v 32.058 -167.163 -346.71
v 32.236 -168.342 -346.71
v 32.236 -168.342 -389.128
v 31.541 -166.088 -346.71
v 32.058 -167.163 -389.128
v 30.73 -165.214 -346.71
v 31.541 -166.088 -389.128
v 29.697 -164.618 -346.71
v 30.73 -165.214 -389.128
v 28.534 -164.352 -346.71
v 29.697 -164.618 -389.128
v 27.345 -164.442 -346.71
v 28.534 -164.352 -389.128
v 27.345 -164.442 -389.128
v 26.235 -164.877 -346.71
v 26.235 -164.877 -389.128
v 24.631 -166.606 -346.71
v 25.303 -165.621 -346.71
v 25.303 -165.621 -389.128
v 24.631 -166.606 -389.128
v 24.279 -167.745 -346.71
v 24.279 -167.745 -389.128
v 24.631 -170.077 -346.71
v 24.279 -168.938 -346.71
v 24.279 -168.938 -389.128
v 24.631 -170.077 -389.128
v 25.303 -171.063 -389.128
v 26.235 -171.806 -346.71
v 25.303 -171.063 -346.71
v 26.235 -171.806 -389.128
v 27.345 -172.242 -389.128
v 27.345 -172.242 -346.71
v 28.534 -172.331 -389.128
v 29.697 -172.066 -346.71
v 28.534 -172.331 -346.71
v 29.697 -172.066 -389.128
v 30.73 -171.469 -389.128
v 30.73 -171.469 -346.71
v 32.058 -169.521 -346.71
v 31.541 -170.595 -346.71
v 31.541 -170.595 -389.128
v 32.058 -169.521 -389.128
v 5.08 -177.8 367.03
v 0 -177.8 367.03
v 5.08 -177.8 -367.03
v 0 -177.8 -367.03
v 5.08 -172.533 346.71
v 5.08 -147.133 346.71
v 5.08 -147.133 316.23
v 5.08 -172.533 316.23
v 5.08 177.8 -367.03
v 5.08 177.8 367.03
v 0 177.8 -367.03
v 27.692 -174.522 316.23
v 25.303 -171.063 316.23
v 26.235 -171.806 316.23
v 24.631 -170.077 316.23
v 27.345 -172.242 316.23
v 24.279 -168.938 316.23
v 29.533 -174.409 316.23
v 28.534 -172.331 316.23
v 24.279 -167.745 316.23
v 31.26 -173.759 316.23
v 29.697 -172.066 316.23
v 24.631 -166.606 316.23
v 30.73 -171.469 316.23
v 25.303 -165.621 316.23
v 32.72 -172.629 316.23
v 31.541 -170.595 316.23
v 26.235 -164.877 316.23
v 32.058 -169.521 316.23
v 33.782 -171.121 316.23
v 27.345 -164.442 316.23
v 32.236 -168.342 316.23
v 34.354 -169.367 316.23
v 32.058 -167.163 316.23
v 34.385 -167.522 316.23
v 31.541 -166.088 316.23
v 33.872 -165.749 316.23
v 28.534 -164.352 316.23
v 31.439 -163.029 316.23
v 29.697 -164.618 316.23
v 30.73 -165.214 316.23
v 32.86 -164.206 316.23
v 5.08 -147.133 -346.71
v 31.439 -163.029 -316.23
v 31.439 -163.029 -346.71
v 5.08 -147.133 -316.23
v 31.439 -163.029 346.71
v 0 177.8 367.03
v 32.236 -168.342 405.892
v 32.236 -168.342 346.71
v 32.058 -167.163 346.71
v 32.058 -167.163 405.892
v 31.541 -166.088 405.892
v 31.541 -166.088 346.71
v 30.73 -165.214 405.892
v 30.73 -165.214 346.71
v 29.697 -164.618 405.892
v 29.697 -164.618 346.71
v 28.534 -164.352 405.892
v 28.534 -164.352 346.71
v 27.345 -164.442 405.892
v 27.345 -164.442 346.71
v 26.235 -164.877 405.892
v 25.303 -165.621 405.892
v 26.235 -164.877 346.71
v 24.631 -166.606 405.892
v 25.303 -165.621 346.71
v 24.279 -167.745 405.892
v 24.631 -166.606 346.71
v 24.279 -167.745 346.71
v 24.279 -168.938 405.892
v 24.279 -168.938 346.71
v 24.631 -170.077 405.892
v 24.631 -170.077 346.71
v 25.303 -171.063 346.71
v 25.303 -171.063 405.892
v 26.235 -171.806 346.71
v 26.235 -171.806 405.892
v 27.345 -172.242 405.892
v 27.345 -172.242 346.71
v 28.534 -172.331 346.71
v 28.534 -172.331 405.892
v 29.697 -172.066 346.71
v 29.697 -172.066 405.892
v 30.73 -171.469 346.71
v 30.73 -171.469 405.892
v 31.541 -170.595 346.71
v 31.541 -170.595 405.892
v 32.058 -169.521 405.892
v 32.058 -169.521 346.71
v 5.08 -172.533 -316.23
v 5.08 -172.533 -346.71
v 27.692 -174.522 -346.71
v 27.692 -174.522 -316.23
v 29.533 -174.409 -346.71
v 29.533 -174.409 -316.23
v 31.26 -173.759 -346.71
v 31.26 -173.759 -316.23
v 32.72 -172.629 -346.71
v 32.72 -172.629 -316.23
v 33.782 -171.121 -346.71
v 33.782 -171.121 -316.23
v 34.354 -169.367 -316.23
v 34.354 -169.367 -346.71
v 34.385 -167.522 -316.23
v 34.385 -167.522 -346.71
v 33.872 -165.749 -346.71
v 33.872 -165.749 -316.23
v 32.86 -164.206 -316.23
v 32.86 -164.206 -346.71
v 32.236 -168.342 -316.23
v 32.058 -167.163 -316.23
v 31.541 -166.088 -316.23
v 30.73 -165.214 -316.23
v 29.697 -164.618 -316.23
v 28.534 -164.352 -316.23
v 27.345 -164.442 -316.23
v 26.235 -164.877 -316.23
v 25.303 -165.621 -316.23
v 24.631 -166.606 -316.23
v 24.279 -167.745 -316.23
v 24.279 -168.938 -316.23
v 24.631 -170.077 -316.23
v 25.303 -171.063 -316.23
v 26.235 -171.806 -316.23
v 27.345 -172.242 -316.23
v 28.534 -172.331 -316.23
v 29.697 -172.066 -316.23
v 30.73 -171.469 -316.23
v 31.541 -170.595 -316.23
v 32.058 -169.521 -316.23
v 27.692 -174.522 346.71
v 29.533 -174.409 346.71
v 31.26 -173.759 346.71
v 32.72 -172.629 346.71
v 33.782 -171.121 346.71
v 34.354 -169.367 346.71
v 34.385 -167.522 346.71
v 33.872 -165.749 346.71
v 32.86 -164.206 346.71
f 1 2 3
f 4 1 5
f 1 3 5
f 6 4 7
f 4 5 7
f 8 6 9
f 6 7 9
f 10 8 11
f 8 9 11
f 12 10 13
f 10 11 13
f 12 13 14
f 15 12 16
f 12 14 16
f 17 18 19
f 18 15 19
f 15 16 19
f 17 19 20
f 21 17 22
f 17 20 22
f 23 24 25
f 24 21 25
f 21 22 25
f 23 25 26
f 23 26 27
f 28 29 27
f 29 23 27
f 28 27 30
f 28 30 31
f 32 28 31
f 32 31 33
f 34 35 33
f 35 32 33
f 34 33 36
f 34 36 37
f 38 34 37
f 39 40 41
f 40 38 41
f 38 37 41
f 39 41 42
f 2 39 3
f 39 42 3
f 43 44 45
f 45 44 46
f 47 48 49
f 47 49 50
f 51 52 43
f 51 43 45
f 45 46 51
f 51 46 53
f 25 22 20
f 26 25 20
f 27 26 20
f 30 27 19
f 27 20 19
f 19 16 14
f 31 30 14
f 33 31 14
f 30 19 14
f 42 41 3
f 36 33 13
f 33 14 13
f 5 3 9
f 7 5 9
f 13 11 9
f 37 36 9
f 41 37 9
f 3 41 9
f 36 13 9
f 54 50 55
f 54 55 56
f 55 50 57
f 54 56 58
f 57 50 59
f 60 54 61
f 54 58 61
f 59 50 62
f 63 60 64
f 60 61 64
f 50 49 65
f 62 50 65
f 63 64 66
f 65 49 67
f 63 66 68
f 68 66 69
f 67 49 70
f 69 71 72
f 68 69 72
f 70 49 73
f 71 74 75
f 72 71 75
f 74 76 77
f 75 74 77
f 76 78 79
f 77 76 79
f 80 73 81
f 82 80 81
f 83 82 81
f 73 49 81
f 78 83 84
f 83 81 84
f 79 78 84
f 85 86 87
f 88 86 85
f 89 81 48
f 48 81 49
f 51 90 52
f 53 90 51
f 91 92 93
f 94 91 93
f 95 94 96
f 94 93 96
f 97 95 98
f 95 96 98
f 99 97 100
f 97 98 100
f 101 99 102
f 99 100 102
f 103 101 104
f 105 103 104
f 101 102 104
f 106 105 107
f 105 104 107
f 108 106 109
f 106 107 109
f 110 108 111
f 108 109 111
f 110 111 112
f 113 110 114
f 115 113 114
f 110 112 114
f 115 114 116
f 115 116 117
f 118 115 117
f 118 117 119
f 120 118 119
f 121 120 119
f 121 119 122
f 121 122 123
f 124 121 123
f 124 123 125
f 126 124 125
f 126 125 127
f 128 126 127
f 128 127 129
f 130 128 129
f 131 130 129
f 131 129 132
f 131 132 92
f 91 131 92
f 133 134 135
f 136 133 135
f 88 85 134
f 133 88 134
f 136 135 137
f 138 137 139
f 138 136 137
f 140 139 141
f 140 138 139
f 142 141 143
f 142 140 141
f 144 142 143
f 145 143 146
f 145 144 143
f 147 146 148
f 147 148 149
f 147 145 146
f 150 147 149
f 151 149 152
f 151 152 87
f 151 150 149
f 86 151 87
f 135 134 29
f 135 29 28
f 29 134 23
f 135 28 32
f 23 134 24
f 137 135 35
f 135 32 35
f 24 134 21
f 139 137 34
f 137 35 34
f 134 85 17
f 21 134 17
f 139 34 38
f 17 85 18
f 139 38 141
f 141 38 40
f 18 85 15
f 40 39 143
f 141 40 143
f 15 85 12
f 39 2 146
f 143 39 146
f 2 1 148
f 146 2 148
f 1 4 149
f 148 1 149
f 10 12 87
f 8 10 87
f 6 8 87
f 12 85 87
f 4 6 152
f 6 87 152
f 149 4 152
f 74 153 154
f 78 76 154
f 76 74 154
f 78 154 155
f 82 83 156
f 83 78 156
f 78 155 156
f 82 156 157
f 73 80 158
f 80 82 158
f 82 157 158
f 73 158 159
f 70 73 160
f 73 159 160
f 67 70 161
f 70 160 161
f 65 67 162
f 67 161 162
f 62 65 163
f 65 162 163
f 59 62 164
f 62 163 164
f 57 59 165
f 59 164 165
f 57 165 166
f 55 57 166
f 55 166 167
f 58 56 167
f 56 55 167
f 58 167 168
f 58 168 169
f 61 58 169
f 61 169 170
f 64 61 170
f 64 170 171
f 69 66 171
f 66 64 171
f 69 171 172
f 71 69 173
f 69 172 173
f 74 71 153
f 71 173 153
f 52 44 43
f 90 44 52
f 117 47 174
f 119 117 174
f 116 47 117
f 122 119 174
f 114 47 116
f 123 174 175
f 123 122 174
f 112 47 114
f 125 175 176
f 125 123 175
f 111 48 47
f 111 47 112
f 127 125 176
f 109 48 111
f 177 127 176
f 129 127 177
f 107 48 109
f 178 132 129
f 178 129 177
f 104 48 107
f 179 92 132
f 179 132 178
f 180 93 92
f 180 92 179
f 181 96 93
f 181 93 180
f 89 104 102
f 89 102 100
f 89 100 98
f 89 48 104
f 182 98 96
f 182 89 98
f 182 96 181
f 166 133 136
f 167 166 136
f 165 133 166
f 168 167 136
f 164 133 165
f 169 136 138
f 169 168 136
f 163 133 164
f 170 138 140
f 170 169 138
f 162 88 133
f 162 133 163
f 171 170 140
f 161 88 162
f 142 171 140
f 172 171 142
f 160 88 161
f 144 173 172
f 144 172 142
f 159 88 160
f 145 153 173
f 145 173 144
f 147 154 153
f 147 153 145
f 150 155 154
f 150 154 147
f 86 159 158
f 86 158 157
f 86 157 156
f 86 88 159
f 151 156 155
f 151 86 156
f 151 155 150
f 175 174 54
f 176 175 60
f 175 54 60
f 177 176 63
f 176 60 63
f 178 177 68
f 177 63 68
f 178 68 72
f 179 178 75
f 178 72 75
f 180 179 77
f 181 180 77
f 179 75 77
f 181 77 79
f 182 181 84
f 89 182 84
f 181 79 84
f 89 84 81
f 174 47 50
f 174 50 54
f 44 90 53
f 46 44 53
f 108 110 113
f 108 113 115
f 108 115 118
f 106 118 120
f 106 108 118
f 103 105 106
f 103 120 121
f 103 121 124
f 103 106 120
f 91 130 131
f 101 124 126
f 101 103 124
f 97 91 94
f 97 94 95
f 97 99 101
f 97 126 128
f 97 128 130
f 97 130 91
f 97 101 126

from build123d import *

# Parameters (mm, degrees)
SKETCH1_W                = 734.06
SKETCH1_H                = 355.6
BOSS_EXTRUDE1_DEPTH      = 5.08
SKETCH6_R                = 4.0005
BOSS_EXTRUDE2_DEPTH      = 30.48
BOSS_EXTRUDE3_DEPTH      = 59.182
BOSS_EXTRUDE3_DEPTH_BACK = 735.838
SKETCH7_R                = 4.0005


with BuildPart() as part:
    # Sketch1 → Boss-Extrude1 (new body)
    with BuildSketch(Plane(origin=(0, 0, 0), x_dir=(0, 0, -1), z_dir=(1, 0, 0))):
        Rectangle(SKETCH1_W, SKETCH1_H)
    extrude(amount=BOSS_EXTRUDE1_DEPTH)


with BuildPart() as body_2:
    # Sketch6 → Boss-Extrude2 (new body)
    with BuildSketch(Plane.XY.offset(316.23)):
        with BuildLine():
            Line((5.08, -147.133142153), (5.08, -172.533142153))
            Line((5.08, -172.533142153), (27.691604266, -174.522209914))
            ThreePointArc((27.691604266, -174.522209914), (34.133973448, -170.265087909), (31.439236588, -163.028679843))
            Line((31.439236588, -163.028679843), (5.08, -147.133142153))
        make_face()
        with Locations(Location((28.23528027, -168.341733372, 0), (0, 0, 180))):
            Circle(SKETCH6_R, mode=Mode.SUBTRACT)
    extrude(amount=BOSS_EXTRUDE2_DEPTH)


with BuildPart() as body_3:
    # Mirror5: mirrored copy
    add(body_2.part.mirror(Plane.XY))


with BuildPart() as body_2_1:
    add(body_2.part)

    add(body_3.part)  # Boss-Extrude3 merges body 3
    # Sketch7 → Boss-Extrude3 (add, two sides: drawn at the far end of the back side and taken through both)
    with BuildSketch(Plane.XY.offset(346.71).offset(-BOSS_EXTRUDE3_DEPTH_BACK)):
        with Locations((28.23528027, -168.341733372)):
            Circle(SKETCH7_R)
    extrude(amount=BOSS_EXTRUDE3_DEPTH + BOSS_EXTRUDE3_DEPTH_BACK)


solid = Compound([part.part, body_2_1.part])
